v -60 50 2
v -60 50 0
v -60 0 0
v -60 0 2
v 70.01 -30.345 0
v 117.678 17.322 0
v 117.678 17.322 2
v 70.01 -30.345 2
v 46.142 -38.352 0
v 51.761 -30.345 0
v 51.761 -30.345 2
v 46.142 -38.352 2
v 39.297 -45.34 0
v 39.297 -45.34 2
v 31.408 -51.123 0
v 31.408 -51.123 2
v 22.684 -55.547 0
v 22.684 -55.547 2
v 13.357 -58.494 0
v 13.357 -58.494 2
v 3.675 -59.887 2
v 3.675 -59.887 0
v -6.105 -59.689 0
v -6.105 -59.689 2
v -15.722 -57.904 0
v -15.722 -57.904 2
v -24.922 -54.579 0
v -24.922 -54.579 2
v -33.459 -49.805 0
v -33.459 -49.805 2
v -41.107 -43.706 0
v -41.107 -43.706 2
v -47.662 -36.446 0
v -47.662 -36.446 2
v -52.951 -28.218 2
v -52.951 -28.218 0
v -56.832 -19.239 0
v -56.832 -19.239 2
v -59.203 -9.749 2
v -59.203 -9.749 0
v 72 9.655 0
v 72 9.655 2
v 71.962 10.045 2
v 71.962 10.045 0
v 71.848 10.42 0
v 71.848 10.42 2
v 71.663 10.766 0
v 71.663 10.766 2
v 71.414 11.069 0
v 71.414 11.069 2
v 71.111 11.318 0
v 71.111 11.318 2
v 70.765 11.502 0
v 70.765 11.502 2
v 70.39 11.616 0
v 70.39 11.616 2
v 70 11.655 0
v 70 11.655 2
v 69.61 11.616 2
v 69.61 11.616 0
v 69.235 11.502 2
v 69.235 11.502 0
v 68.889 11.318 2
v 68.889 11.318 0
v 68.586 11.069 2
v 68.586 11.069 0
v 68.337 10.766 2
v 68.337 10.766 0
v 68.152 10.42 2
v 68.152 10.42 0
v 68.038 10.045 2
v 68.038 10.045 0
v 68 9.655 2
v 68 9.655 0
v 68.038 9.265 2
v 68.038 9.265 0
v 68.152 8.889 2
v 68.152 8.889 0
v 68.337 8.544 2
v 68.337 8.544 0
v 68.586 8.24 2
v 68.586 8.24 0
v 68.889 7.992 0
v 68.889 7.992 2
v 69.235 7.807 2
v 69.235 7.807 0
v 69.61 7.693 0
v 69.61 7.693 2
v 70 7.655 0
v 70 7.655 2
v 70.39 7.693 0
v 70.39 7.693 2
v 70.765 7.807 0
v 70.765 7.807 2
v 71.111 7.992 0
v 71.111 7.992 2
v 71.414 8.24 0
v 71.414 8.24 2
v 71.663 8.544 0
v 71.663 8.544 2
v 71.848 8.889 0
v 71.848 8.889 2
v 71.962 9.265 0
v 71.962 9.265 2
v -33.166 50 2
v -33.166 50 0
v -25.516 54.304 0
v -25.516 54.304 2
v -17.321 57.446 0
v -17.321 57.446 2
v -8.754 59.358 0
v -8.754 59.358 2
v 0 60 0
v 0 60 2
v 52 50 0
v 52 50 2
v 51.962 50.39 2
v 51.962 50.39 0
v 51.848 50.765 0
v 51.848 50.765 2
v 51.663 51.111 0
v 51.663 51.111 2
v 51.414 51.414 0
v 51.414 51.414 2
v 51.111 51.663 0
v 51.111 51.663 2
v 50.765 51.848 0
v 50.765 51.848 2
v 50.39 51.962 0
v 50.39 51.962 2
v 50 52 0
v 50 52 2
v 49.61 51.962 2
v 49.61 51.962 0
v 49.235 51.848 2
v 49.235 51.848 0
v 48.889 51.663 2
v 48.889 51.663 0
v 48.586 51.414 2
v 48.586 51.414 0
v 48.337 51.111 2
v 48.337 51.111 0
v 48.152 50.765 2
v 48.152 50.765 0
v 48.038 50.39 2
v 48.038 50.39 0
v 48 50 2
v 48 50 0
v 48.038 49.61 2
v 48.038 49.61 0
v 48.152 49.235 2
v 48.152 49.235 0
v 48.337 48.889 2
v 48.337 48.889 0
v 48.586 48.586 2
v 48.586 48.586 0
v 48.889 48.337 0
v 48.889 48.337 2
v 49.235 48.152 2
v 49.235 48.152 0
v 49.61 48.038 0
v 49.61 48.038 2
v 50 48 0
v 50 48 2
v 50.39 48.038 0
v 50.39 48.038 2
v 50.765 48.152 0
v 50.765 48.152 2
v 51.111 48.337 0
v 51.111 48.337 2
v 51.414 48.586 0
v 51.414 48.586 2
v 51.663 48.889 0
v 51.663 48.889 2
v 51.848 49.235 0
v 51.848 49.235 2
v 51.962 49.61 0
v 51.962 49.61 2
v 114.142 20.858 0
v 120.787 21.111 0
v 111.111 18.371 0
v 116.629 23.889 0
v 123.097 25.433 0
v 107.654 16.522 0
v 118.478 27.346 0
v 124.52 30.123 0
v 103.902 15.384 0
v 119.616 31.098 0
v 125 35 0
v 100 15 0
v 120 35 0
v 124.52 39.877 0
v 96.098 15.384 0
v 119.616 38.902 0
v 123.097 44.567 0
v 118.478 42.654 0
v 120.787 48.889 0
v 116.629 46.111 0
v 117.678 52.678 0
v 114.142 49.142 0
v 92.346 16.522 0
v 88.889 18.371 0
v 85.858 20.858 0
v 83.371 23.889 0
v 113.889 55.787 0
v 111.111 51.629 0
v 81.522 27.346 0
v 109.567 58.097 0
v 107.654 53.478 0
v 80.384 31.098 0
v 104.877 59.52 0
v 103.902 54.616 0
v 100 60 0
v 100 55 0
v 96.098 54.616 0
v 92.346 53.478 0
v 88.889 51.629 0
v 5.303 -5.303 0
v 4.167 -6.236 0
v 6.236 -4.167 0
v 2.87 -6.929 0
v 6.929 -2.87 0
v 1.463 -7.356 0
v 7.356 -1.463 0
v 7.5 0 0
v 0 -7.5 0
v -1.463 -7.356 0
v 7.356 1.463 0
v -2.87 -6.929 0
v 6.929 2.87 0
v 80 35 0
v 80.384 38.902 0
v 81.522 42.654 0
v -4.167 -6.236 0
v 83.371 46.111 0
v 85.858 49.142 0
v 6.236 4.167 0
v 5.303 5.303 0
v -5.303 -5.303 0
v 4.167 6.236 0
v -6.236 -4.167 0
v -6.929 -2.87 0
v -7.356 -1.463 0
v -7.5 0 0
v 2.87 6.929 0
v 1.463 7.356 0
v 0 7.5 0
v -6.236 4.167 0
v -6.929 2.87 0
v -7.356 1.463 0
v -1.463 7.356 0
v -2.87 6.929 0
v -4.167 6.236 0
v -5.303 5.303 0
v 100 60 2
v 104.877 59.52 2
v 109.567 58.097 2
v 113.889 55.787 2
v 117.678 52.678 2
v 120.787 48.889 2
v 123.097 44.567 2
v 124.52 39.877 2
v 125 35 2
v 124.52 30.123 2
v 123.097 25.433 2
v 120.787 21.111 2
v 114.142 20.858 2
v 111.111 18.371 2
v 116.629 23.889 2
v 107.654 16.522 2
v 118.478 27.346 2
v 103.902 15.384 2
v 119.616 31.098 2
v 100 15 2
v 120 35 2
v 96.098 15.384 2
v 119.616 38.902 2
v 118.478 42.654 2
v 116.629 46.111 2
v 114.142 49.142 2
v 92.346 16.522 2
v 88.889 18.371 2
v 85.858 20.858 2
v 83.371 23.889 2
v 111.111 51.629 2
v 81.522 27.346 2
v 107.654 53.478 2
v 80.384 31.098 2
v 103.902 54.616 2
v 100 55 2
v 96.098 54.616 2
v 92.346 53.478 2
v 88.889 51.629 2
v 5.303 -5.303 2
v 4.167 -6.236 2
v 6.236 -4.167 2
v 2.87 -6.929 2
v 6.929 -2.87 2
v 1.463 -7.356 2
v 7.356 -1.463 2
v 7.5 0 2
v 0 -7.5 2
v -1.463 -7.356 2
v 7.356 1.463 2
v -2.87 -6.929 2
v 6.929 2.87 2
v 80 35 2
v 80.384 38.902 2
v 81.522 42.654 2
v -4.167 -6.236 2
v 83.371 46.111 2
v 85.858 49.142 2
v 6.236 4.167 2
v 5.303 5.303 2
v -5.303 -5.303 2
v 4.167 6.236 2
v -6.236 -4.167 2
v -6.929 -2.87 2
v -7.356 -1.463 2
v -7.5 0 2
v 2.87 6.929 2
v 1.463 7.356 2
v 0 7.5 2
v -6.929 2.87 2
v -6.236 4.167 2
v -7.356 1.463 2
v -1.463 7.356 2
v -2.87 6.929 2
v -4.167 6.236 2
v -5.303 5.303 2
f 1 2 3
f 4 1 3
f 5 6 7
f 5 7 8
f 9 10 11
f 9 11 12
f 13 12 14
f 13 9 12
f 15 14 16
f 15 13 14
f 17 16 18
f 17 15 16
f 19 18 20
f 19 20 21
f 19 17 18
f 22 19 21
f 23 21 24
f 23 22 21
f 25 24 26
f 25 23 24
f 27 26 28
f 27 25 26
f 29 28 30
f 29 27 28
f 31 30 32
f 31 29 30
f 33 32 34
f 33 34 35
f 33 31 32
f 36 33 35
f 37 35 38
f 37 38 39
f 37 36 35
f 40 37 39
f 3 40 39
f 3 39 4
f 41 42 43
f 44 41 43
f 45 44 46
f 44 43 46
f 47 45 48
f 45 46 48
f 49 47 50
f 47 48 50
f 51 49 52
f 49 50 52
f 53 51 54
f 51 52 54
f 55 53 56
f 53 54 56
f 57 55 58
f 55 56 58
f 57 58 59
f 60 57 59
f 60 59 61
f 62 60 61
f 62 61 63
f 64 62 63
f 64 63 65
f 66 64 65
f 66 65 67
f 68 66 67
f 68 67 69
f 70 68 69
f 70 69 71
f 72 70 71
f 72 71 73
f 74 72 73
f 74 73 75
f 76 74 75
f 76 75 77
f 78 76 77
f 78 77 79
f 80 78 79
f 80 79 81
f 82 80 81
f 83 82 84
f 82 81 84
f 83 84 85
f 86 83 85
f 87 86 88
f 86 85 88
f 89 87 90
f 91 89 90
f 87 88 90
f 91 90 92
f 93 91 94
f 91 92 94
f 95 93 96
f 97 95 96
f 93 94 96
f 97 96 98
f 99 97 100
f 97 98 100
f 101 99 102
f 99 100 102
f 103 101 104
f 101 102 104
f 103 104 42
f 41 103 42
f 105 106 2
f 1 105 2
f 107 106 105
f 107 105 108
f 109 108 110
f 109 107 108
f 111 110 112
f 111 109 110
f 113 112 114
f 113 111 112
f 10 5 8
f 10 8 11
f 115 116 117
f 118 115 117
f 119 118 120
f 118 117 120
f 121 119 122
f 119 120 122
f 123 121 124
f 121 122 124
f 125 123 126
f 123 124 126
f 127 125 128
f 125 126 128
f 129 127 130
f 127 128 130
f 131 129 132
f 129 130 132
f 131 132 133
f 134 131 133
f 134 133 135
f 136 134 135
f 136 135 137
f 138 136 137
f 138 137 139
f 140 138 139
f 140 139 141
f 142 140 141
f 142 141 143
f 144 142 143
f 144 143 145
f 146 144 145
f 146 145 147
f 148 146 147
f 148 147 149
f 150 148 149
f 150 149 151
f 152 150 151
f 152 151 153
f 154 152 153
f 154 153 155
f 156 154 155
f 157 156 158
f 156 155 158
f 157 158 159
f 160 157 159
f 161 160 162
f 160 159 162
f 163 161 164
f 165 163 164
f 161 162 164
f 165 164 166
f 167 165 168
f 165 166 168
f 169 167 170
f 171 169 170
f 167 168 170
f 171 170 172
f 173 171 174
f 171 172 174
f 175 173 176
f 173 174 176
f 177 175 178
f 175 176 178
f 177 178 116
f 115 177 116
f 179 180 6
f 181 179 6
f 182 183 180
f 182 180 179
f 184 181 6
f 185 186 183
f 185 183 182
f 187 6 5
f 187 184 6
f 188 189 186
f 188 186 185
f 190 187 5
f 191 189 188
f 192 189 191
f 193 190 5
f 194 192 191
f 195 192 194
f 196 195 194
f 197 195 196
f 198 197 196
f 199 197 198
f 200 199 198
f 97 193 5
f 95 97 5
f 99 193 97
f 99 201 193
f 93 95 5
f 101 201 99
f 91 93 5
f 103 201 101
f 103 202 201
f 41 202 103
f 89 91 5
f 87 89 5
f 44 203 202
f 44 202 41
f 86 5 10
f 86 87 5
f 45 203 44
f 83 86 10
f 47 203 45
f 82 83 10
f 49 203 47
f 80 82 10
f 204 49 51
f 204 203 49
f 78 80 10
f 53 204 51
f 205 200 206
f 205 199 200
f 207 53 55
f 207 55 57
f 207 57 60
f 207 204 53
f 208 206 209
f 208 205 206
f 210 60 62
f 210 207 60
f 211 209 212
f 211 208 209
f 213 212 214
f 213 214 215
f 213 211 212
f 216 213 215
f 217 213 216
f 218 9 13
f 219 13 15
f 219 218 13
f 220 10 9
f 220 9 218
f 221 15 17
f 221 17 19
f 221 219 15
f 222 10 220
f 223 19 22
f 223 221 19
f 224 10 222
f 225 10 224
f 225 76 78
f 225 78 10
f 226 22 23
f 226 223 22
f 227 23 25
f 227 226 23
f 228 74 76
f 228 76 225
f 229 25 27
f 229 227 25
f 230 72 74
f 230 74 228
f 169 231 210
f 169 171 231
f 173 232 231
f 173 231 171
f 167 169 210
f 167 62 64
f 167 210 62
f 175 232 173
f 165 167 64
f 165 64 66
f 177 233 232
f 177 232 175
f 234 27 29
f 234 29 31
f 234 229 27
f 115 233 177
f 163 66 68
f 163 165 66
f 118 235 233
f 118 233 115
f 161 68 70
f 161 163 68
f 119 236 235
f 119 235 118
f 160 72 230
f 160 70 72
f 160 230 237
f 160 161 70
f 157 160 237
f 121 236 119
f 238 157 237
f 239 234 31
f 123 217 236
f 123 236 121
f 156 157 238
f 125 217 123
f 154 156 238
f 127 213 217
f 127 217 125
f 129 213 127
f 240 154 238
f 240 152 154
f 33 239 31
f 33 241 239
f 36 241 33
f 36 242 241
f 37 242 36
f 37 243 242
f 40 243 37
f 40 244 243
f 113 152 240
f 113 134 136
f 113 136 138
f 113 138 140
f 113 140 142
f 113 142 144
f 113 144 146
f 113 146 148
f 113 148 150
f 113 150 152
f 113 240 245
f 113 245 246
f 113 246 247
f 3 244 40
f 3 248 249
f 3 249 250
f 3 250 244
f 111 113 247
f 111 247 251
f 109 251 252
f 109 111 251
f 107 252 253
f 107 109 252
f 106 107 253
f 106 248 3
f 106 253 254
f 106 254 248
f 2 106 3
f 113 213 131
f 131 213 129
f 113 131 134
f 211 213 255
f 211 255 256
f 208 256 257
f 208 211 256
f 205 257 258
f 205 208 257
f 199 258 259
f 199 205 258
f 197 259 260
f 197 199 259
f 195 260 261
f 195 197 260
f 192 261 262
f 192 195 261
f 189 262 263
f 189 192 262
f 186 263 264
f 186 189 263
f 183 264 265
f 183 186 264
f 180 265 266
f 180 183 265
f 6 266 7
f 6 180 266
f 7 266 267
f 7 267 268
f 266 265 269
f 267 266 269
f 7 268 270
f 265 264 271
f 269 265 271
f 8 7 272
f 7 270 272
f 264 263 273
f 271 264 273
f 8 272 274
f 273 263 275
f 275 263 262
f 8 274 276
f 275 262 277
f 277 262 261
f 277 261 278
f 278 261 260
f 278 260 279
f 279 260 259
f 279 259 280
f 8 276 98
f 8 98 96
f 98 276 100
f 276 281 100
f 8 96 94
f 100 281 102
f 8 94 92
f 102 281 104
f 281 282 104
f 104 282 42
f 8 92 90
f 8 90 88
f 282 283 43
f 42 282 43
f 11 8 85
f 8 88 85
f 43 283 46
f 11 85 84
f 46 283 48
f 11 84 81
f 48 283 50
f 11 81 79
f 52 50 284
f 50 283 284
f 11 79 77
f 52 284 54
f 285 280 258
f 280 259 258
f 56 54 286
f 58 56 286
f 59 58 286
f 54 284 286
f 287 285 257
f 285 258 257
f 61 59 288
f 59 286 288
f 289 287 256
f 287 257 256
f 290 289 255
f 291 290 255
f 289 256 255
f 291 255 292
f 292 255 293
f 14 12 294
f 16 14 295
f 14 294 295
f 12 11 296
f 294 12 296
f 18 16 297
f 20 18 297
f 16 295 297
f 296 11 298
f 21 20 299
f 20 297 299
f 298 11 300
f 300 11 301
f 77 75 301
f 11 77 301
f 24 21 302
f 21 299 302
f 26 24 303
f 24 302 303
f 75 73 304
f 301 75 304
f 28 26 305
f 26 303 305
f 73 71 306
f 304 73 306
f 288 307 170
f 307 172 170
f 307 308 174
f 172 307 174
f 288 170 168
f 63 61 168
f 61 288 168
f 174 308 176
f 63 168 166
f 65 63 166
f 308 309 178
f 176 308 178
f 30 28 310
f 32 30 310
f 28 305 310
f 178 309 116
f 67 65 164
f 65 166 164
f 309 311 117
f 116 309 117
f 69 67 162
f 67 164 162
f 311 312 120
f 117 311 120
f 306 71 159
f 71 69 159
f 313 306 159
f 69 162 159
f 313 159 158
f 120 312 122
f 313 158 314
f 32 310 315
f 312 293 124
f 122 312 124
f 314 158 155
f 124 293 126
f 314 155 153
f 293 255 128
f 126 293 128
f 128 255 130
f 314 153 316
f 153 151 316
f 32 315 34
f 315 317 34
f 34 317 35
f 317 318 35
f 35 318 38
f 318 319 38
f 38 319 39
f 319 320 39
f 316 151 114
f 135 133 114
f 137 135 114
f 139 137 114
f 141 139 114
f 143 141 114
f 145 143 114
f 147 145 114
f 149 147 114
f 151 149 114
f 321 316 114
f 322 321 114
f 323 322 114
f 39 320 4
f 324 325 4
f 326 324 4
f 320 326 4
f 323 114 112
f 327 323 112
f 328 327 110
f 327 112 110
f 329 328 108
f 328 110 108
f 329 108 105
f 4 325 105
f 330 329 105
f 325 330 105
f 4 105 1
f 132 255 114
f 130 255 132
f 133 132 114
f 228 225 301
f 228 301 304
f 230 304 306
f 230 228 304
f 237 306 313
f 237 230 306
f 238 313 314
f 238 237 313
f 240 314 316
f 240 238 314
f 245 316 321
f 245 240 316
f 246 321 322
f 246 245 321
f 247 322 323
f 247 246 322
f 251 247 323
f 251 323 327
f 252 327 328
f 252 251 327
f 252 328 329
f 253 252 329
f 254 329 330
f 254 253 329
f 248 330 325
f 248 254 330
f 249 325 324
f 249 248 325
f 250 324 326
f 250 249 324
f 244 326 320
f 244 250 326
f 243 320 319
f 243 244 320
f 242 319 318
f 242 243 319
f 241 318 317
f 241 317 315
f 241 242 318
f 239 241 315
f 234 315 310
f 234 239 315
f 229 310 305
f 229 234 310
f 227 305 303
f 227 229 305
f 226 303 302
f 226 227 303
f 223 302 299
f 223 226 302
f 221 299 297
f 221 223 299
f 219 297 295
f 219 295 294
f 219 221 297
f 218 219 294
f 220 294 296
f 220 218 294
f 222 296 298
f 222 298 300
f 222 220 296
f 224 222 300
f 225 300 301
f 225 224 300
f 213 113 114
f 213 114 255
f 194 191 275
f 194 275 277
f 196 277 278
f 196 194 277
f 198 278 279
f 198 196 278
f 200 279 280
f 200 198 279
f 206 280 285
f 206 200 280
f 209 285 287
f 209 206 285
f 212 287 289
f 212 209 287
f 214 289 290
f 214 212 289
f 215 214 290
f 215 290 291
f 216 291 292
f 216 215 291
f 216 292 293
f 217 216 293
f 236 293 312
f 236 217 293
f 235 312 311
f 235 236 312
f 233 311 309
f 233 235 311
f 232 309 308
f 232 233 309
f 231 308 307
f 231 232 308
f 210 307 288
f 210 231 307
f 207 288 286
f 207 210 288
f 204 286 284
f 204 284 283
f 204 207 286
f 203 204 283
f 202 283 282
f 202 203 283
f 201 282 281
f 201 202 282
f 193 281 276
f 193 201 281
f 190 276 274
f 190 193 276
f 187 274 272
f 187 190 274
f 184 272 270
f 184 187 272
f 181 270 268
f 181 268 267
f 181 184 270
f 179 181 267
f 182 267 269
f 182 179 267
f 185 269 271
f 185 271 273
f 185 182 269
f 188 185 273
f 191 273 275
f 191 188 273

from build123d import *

# Parameters (mm, degrees)
SKETCH1_R           = 20
SKETCH1_R_2         = 7.5
BOSS_EXTRUDE1_DEPTH = 2
CUT_EXTRUDE1_REACH  = 140.669
SKETCH3_R           = 2


with BuildPart() as part:
    # Sketch1 → Boss-Extrude1 (new body)
    # profile 1 of 2: a face of its own
    with BuildSketch(Plane.XY):
        with BuildLine():
            ThreePointArc((-60, 0), (-52.867640737, 28.372743309), (-33.166247904, 50))
            Line((-33.166247904, 50), (-60, 50))
            Line((-60, 50), (-60, 0))
        make_face()
    # profile 2 of 2: a face of its own
    with BuildSketch(Plane.XY):
        with BuildLine():
            Line((117.67766953, 17.32233047), (70.010033914, -30.345305145))
            Line((70.010033914, -30.345305145), (51.7606265, -30.345305145))
            ThreePointArc((51.7606265, -30.345305145), (-52.061109807, -29.826847732), (0, 60))
            Line((0, 60), (100, 60))
            ThreePointArc((100, 60), (123.096988313, 44.567085809), (117.67766953, 17.32233047))
        make_face()
        with Locations((100, 35)):
            Circle(SKETCH1_R, mode=Mode.SUBTRACT)
        Circle(SKETCH1_R_2, mode=Mode.SUBTRACT)
    extrude(amount=BOSS_EXTRUDE1_DEPTH)

    # Sketch3 → Cut-Extrude1 (cut, up to next)
    with BuildSketch(Plane.XY.offset(2), mode=Mode.PRIVATE) as cut_extrude1_sk1:
        with Locations((50, 50)):
            Circle(SKETCH3_R)
    cut_extrude1_tool1 = extrude(cut_extrude1_sk1.sketch, amount=-CUT_EXTRUDE1_REACH, mode=Mode.PRIVATE) & part.part
    # Sketch3 → Cut-Extrude1 (cut, up to next)
    with BuildSketch(Plane.XY.offset(2), mode=Mode.PRIVATE) as cut_extrude1_sk2:
        with Locations((70, 9.654694855)):
            Circle(SKETCH3_R)
    cut_extrude1_tool2 = extrude(cut_extrude1_sk2.sketch, amount=-CUT_EXTRUDE1_REACH, mode=Mode.PRIVATE) & part.part
    add(cut_extrude1_tool1.solids().sort_by_distance((50, 50, 2))[0], mode=Mode.SUBTRACT)
    add(cut_extrude1_tool2.solids().sort_by_distance((70, 9.654695, 2))[0], mode=Mode.SUBTRACT)


solid = part.part
